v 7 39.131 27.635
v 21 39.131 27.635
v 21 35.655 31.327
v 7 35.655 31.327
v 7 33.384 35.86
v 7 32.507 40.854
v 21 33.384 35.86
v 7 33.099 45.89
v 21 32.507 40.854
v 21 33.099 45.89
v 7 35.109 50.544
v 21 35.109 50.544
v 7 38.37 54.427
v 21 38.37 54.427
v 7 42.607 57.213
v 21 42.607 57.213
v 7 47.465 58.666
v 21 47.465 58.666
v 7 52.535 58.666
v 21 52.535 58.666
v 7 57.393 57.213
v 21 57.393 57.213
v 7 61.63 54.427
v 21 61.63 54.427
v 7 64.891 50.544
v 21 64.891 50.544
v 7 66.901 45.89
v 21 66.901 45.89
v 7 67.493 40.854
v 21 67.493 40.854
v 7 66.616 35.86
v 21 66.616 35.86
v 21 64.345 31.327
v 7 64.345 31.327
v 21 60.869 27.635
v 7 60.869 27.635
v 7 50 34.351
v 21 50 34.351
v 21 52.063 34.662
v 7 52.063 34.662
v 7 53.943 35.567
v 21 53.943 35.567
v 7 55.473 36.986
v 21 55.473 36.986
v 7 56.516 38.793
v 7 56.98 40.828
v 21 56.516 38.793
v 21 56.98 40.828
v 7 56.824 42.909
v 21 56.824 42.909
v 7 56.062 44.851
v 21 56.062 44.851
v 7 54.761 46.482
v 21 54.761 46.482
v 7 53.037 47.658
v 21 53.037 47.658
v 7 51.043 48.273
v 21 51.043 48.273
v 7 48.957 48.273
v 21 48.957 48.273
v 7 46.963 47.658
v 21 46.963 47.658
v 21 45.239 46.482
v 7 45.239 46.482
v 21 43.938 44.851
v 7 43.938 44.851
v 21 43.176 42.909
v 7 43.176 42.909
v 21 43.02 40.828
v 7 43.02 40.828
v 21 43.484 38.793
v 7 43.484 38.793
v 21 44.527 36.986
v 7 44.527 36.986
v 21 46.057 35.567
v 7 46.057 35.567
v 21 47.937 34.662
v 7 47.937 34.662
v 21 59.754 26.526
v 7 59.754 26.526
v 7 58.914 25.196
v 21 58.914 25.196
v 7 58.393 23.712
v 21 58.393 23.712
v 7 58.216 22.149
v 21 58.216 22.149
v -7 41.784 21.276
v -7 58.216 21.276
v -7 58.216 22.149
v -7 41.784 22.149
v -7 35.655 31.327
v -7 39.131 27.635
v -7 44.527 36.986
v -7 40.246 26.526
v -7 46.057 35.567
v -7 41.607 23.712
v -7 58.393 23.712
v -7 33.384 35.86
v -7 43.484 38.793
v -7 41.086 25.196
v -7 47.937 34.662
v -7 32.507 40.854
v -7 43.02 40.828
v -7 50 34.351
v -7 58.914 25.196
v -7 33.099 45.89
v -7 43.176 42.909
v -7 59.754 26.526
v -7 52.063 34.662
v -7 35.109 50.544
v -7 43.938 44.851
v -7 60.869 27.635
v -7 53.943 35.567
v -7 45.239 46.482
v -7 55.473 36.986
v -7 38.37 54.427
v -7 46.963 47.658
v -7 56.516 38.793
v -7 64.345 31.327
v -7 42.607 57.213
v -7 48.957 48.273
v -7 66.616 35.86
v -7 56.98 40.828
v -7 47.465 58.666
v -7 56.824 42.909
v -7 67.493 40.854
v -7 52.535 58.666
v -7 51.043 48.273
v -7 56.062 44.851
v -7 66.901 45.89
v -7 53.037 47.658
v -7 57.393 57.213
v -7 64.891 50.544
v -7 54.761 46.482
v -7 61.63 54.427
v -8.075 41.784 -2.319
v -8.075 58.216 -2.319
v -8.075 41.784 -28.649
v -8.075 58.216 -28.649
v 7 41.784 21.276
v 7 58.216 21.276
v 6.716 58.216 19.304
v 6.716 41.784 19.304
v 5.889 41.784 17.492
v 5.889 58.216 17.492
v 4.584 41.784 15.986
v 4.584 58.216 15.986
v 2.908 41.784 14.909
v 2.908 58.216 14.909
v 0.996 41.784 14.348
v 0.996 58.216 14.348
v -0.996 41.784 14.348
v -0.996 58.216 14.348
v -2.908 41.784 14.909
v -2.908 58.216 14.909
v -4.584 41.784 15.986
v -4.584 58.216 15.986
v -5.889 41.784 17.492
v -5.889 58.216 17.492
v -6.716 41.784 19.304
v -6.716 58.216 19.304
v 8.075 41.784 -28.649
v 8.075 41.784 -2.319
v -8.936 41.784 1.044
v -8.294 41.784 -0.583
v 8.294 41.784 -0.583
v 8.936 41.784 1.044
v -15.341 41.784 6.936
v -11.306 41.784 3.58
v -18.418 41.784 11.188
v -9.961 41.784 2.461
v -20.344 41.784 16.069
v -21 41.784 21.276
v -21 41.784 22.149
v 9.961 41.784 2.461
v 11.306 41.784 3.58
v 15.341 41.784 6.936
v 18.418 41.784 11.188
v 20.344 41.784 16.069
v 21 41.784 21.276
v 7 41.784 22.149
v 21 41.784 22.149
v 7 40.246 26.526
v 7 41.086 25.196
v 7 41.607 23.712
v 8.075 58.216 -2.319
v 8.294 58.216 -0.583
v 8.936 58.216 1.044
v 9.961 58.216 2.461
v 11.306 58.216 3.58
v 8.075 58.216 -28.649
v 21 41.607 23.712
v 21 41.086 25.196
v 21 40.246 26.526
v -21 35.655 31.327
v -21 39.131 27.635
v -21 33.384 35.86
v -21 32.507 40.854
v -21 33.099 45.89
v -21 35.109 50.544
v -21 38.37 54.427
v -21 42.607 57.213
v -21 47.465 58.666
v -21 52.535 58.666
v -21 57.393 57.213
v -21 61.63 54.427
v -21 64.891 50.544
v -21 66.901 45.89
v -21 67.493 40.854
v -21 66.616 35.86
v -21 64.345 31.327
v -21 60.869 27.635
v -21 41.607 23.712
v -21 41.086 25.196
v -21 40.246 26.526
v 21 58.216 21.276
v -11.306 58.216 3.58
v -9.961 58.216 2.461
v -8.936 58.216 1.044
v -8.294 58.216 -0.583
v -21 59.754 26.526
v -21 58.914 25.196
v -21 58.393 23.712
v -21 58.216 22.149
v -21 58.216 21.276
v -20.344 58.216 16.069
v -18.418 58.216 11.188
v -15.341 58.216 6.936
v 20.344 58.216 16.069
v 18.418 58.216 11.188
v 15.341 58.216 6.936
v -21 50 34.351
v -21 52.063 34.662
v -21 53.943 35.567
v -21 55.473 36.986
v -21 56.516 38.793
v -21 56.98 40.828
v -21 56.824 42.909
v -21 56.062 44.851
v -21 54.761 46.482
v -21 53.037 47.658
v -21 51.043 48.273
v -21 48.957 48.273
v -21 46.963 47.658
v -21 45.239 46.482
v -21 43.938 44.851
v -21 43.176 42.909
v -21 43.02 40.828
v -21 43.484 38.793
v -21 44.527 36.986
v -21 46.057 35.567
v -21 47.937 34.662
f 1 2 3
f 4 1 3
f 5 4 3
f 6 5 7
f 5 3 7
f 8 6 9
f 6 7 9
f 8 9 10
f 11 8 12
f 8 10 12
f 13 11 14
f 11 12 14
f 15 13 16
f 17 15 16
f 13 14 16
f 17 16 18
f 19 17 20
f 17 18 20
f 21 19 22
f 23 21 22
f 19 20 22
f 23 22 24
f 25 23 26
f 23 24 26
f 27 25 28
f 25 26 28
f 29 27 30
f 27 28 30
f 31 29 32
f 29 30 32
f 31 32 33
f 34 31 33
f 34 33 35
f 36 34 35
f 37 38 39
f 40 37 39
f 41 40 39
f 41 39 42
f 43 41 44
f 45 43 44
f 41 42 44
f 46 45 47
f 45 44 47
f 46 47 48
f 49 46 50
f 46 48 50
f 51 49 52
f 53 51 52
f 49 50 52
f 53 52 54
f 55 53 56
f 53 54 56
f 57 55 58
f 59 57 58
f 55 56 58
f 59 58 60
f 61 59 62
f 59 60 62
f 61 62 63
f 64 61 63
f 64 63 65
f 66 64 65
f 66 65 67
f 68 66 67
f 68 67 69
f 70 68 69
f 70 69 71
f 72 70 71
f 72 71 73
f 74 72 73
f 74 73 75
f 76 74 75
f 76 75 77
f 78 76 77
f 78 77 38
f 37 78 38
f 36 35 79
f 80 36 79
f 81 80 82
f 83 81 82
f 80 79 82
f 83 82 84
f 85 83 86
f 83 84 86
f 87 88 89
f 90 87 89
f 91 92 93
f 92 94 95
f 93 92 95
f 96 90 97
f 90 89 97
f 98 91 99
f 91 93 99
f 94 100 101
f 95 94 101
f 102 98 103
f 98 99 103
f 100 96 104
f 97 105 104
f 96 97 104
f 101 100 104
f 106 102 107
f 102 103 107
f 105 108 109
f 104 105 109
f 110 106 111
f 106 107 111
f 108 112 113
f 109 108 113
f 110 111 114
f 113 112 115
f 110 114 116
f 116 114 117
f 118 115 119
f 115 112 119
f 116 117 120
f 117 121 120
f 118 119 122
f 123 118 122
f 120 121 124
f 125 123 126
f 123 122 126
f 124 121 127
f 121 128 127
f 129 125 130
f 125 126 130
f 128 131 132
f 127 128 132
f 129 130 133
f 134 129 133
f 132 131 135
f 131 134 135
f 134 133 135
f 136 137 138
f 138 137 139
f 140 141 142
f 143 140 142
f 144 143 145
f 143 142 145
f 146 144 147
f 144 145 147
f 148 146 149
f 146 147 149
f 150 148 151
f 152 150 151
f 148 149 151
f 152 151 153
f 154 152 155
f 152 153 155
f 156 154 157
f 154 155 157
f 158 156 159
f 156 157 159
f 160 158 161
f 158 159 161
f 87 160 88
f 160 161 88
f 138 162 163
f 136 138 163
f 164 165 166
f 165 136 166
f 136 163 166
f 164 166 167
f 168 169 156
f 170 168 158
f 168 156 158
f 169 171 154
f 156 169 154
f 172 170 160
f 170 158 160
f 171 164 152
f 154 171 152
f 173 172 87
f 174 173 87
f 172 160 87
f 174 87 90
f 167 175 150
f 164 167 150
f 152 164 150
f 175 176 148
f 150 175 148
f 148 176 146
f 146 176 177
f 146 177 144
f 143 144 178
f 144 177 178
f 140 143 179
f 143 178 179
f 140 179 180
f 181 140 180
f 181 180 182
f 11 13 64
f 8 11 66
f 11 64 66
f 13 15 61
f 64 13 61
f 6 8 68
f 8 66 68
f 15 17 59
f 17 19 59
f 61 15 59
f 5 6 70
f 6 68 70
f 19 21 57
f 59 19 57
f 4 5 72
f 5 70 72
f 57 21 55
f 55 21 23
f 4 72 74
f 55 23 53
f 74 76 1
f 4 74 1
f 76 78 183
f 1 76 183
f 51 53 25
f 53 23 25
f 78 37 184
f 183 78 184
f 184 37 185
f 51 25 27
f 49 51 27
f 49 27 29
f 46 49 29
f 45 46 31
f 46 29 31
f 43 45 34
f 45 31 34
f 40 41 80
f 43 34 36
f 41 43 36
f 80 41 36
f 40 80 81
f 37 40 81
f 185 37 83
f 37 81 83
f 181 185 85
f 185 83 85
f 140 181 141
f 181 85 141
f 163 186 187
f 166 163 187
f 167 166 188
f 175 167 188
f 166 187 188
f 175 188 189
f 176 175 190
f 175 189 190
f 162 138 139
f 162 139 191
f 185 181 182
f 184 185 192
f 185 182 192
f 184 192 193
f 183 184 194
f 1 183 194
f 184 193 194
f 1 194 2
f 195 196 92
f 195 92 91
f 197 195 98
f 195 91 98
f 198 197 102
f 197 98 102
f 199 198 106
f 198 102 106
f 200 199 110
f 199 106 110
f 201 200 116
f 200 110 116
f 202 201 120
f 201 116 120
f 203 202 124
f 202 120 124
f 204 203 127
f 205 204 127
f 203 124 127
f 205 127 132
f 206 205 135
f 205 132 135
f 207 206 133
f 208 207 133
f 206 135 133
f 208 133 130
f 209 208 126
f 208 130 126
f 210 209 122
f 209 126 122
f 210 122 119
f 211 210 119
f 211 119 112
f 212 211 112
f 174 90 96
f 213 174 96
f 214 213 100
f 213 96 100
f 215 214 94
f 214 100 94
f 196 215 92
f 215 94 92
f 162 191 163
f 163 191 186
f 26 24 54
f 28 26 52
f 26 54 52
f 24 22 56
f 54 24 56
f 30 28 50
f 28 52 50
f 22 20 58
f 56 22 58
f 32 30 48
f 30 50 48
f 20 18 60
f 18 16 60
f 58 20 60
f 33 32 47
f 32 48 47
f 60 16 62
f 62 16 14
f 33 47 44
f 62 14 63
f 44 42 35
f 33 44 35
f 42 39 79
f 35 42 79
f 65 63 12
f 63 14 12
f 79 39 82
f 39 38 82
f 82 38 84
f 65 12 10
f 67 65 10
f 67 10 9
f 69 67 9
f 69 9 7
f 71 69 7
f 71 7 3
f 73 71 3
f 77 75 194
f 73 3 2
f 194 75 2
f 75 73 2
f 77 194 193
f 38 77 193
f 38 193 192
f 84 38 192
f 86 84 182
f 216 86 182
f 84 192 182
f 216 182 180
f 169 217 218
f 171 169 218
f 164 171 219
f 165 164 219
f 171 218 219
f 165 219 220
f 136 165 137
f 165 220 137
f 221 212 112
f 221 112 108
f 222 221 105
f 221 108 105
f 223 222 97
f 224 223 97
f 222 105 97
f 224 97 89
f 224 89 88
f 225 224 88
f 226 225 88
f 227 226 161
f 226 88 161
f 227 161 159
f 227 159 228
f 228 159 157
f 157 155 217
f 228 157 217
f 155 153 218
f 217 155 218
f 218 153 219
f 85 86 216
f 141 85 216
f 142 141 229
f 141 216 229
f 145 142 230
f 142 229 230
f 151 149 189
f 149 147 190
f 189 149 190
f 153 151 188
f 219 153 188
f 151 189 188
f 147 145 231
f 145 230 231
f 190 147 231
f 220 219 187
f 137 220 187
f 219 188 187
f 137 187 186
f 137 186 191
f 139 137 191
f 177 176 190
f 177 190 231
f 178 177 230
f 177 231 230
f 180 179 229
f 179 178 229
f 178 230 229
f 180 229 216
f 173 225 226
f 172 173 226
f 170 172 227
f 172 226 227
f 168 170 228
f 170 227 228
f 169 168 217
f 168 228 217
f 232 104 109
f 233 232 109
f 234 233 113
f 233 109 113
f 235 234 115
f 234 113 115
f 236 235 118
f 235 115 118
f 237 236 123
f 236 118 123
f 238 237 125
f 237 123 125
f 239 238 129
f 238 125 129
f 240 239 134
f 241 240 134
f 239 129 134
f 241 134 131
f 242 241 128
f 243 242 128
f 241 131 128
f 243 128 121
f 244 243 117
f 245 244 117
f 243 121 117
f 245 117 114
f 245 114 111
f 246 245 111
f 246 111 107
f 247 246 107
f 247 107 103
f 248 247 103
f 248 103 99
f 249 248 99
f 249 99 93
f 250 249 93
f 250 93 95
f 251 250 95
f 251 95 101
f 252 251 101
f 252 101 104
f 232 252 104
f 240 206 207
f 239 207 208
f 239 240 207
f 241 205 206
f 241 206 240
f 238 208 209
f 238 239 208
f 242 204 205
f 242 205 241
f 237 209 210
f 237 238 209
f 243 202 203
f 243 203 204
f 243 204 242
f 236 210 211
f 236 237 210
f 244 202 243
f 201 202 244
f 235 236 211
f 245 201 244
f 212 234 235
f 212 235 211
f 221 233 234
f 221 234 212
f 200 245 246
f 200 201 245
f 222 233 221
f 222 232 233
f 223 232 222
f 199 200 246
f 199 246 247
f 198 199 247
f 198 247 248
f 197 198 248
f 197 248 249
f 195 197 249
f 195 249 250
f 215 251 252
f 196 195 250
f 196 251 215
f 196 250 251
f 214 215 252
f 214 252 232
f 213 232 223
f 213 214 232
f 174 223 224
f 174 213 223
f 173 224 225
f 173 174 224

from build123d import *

# Parameters (mm, degrees)
SKETCH2_W           = 120
SKETCH2_H           = 250
BOSS_EXTRUDE1_DEPTH = 100
SKETCH4_R           = 20
CUT_EXTRUDE1_DEPTH  = 100
SKETCH5_R           = 20
CUT_EXTRUDE5_DEPTH  = 201.062490237
SCALE1_SCALE        = 0.35


with BuildPart() as part:
    # Sketch2 → Boss-Extrude1 (new body)
    with BuildSketch(Plane(origin=(0, 0, 0), x_dir=(1, 0, 0), z_dir=(0, 1, 0))):
        Rectangle(SKETCH2_W, SKETCH2_H)
    extrude(amount=BOSS_EXTRUDE1_DEPTH)

    # Sketch4 → Cut-Extrude1 (cut)
    with BuildSketch(Plane(origin=(0, 100, 0), x_dir=(1, 0, 0), z_dir=(0, 1, 0))):
        with BuildLine():
            Line((-60, 125), (-60, -17.644609552))
            ThreePointArc((-60, -17.644609552), (-52.622366518, 11.180492718), (-32.303782241, 32.916893747))
            ThreePointArc((-32.303782241, 32.916893747), (-25.530920786, 40.16236081), (-23.071709655, 49.770728302))
            Line((-23.071709655, 49.770728302), (-23.071709655, 125))
            Line((-23.071709655, 125), (-60, 125))
        make_face()
        with BuildLine():
            ThreePointArc((32.303782241, 32.916893747), (52.62236667, 11.18049244), (60, -17.644610185))
            Line((60, -17.644610185), (60, 125))
            Line((60, 125), (23.071709655, 125))
            Line((23.071709655, 125), (23.071709655, 49.770728302))
            ThreePointArc((23.071709655, 49.770728302), (25.530920786, 40.16236081), (32.303782241, 32.916893747))
        make_face()
        with Locations((0, -17.644609919)):
            Circle(SKETCH4_R)
        with BuildLine():
            Line((-20, -17.644609919), (-20, -74.213152414))
            ThreePointArc((-20, -74.213152414), (0, -77.644609919), (20, -74.213152414))
            Line((20, -74.213152414), (20, -17.644609919))
            ThreePointArc((20, -17.644609919), (0, -37.644609919), (-20, -17.644609919))
        make_face()
        with BuildLine():
            Line((-20, -74.213152414), (-20, -125))
            Line((-20, -125), (20, -125))
            Line((20, -125), (20, -74.213152414))
            ThreePointArc((20, -74.213152414), (0, -77.644609919), (-20, -74.213152414))
        make_face()
    extrude(amount=-CUT_EXTRUDE1_DEPTH, mode=Mode.SUBTRACT)

    # Sketch5 → Cut-Extrude5 (cut, through all)
    # profile 1 of 2: a face of its own
    with BuildSketch(Plane(origin=(60, 0, 0), x_dir=(0, 0, -1), z_dir=(1, 0, 0))):
        Polygon((125, 100), (49.770728302, 100), (32.916893747, 100), (-17.644609919, 100), (-125, 100), (-125, 0), (-17.644609919, 0), (32.916893747, 0), (49.770728302, 0), (125, 0), align=None)
        with BuildLine():
            Line((125, 73.474979738), (125, 26.525020262))
            Line((125, 26.525020262), (-20.137206262, 26.525020262))
            ThreePointArc((-20.137206262, 26.525020262), (-28.84270867, 24.530970051), (-35.812290187, 18.946443044))
            ThreePointArc((-35.812290187, 18.946443044), (-125, 50), (-35.812290187, 81.053556956))
            ThreePointArc((-35.812290187, 81.053556956), (-28.84270867, 75.469029949), (-20.137206262, 73.474979738))
            Line((-20.137206262, 73.474979738), (125, 73.474979738))
        make_face(mode=Mode.SUBTRACT)
    # profile 2 of 2: a face of its own
    with BuildSketch(Plane(origin=(60, 0, 0), x_dir=(0, 0, -1), z_dir=(1, 0, 0))):
        with Locations((-75, 50)):
            Circle(SKETCH5_R)
    extrude(amount=-CUT_EXTRUDE5_DEPTH, mode=Mode.SUBTRACT)


with BuildPart() as cut_extrude5_kept_piece:
    # of the separate pieces the step leaves, the one the design keeps (cut_extrude5_pieces_kept)
    add(part.part.solids().sort_by_distance((23.071709655, 73.474979738, -125))[0])


with BuildPart() as cut_extrude5_kept_piece_1:
    # Scale1: scaled about (0, 50, 23.23209908)
    add(cut_extrude5_kept_piece.part.scale(SCALE1_SCALE).moved(Location((0, 32.5, 15.100864402))))


solid = cut_extrude5_kept_piece_1.part
